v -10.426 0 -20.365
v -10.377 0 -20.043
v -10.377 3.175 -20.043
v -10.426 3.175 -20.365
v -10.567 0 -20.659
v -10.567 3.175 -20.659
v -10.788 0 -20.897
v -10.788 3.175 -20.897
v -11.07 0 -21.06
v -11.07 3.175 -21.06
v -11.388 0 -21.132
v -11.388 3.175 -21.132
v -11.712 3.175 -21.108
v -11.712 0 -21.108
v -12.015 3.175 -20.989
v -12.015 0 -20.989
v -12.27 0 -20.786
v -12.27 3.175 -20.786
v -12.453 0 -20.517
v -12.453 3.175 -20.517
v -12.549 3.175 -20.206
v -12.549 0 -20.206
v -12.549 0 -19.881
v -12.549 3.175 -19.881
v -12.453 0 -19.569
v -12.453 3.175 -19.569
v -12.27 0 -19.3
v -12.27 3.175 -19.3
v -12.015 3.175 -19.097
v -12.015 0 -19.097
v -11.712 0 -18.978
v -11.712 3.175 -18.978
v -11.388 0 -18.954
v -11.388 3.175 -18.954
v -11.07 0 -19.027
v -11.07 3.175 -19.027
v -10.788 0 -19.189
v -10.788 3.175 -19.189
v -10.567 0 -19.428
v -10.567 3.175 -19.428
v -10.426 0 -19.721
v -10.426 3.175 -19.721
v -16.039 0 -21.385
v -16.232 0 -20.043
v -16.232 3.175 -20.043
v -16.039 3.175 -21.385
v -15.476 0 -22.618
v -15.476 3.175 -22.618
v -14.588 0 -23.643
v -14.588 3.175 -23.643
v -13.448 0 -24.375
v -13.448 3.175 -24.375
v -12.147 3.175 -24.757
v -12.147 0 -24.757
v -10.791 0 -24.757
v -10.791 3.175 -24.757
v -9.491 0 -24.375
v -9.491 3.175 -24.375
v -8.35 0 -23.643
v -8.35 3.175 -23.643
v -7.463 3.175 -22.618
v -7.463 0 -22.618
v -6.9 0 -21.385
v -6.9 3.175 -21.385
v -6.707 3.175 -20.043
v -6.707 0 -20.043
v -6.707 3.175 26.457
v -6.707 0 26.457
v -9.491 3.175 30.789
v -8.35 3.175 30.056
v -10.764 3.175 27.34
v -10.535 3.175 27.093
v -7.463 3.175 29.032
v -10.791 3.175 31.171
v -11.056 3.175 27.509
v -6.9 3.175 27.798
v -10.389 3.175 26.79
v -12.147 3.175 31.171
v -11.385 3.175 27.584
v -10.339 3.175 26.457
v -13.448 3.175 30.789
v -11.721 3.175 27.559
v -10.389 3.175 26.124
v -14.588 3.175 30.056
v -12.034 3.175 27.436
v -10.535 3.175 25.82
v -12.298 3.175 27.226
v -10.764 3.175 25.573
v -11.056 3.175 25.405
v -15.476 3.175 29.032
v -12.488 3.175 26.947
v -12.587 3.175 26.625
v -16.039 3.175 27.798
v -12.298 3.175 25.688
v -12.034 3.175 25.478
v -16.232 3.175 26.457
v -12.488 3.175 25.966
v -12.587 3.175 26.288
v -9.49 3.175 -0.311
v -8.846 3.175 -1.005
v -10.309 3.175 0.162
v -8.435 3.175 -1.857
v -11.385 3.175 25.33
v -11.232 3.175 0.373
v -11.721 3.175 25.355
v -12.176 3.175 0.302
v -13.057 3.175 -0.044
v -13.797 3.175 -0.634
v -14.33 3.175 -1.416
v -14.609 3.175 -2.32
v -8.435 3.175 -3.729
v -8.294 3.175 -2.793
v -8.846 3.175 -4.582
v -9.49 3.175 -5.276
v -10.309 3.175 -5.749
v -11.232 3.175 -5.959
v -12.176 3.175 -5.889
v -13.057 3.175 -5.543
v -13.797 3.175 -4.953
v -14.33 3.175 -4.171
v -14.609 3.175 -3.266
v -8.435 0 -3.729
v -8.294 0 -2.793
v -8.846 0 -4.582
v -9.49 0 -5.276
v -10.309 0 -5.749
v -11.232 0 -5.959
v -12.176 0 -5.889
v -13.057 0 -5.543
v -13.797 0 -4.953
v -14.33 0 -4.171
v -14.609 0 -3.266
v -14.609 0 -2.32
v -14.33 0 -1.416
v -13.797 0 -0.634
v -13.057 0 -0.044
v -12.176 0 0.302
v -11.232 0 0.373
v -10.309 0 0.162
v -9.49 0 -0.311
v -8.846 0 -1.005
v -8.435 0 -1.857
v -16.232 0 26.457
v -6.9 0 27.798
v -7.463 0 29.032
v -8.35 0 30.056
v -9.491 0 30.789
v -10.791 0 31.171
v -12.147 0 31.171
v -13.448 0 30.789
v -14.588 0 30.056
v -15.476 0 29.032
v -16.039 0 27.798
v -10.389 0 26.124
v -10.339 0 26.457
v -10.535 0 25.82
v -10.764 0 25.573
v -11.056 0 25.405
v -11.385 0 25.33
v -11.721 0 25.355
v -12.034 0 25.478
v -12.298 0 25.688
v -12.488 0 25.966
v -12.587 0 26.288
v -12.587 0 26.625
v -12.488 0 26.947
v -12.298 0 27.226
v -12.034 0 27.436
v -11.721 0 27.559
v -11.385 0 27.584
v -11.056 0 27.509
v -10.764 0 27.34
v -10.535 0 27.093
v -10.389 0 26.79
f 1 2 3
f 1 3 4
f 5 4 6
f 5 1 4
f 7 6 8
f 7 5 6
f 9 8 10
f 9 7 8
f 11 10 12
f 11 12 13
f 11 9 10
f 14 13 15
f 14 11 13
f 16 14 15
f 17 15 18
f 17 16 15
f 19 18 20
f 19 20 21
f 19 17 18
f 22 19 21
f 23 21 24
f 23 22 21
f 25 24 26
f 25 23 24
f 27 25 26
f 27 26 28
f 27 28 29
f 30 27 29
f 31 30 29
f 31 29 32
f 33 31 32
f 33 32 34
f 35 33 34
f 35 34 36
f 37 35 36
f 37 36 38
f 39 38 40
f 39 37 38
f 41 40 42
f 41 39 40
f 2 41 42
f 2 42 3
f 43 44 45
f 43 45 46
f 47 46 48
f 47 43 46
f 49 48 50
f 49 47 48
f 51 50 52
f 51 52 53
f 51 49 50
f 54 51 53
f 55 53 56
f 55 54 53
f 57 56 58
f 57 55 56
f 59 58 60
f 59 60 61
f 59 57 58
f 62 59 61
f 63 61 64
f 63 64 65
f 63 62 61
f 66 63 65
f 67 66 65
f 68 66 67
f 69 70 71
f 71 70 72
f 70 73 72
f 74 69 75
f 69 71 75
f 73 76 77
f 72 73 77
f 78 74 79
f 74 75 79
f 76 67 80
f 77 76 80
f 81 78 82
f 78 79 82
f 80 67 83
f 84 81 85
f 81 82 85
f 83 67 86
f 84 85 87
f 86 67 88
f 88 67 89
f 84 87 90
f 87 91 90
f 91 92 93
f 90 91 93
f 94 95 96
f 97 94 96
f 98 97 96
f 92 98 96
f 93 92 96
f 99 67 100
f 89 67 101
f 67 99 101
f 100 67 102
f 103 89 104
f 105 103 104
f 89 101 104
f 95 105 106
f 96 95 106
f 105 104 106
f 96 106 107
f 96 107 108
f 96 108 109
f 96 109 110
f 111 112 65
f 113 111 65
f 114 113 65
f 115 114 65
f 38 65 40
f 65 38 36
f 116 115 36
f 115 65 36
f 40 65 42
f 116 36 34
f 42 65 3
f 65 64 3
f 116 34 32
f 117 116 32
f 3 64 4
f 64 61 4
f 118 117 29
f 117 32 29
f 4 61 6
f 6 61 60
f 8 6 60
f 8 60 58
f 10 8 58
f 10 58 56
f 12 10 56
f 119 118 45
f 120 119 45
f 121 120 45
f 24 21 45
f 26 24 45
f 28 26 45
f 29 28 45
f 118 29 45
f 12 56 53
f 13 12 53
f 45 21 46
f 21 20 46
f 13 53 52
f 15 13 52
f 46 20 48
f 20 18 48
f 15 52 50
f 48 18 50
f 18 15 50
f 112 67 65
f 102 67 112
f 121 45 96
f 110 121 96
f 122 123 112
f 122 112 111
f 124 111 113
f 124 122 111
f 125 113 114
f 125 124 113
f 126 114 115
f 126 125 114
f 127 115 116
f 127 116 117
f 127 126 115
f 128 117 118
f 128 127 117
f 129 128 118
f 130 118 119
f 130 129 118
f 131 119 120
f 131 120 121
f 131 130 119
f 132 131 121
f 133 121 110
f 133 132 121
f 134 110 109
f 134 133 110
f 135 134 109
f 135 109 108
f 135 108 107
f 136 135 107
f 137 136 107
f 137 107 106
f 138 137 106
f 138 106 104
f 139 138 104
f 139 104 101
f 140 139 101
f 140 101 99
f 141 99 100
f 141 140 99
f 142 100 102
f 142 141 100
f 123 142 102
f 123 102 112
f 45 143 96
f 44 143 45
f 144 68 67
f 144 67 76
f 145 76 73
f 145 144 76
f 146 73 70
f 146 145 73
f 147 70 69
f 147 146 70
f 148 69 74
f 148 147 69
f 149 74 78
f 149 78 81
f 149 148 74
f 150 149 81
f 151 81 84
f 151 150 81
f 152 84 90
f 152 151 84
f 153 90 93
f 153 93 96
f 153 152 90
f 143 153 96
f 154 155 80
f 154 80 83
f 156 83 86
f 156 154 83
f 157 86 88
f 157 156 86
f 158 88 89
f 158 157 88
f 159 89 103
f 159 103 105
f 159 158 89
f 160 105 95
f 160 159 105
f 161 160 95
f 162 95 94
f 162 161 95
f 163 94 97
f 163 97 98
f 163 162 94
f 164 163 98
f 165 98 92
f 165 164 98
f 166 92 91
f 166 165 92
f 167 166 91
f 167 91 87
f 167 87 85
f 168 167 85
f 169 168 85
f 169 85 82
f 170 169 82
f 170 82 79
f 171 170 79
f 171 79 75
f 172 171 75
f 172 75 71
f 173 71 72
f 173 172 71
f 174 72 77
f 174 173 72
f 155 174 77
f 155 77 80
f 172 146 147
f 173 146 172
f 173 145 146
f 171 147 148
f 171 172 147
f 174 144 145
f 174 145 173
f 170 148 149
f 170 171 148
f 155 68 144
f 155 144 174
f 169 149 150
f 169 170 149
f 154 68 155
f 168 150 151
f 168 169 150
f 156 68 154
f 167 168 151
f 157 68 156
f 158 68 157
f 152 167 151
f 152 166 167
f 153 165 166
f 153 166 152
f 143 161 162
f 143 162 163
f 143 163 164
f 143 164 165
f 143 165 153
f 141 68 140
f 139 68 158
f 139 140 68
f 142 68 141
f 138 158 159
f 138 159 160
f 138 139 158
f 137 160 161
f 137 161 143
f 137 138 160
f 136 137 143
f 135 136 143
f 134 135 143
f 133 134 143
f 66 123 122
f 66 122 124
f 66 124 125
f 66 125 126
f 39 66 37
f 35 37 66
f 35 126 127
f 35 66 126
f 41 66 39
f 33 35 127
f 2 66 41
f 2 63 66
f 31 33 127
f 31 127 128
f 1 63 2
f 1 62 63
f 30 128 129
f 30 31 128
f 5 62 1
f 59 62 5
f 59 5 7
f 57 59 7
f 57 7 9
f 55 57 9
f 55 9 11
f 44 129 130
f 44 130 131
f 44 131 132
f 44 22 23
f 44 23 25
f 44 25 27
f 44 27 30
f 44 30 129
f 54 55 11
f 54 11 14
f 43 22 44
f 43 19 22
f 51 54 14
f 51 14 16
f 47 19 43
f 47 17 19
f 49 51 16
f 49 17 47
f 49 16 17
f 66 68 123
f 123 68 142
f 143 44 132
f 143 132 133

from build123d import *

# Parameters (mm, degrees)
SKETCH2_R           = 1.0922
SKETCH2_R_2         = 3.175
SKETCH2_R_3         = 1.1303
BOSS_EXTRUDE2_DEPTH = 3.175


with BuildPart() as part:
    # Sketch2 → Boss-Extrude2 (new body)
    with BuildSketch(Plane(origin=(0, 0, 0), x_dir=(1, 0, 0), z_dir=(0, 1, 0))):
        with BuildLine():
            Line((-6.706711203, 20.043284588), (-6.706711203, -6.456715412))
            Line((-6.706711203, -6.456715412), (-6.706711203, -26.456715412))
            ThreePointArc((-6.706711203, -26.456715412), (-11.469211203, -31.219215412), (-16.231711203, -26.456715412))
            Line((-16.231711203, -26.456715412), (-16.231711203, -6.456715412))
            Line((-16.231711203, -6.456715412), (-16.231711203, 20.043284588))
            ThreePointArc((-16.231711203, 20.043284588), (-11.469211203, 24.805784588), (-6.706711203, 20.043284588))
        make_face()
        with Locations((-11.469211203, 20.043284588)):
            Circle(SKETCH2_R, mode=Mode.SUBTRACT)
        with Locations((-11.469211203, 2.793284588)):
            Circle(SKETCH2_R_2, mode=Mode.SUBTRACT)
        with Locations((-11.469211203, -26.456715412)):
            Circle(SKETCH2_R_3, mode=Mode.SUBTRACT)
    extrude(amount=BOSS_EXTRUDE2_DEPTH)


solid = part.part
